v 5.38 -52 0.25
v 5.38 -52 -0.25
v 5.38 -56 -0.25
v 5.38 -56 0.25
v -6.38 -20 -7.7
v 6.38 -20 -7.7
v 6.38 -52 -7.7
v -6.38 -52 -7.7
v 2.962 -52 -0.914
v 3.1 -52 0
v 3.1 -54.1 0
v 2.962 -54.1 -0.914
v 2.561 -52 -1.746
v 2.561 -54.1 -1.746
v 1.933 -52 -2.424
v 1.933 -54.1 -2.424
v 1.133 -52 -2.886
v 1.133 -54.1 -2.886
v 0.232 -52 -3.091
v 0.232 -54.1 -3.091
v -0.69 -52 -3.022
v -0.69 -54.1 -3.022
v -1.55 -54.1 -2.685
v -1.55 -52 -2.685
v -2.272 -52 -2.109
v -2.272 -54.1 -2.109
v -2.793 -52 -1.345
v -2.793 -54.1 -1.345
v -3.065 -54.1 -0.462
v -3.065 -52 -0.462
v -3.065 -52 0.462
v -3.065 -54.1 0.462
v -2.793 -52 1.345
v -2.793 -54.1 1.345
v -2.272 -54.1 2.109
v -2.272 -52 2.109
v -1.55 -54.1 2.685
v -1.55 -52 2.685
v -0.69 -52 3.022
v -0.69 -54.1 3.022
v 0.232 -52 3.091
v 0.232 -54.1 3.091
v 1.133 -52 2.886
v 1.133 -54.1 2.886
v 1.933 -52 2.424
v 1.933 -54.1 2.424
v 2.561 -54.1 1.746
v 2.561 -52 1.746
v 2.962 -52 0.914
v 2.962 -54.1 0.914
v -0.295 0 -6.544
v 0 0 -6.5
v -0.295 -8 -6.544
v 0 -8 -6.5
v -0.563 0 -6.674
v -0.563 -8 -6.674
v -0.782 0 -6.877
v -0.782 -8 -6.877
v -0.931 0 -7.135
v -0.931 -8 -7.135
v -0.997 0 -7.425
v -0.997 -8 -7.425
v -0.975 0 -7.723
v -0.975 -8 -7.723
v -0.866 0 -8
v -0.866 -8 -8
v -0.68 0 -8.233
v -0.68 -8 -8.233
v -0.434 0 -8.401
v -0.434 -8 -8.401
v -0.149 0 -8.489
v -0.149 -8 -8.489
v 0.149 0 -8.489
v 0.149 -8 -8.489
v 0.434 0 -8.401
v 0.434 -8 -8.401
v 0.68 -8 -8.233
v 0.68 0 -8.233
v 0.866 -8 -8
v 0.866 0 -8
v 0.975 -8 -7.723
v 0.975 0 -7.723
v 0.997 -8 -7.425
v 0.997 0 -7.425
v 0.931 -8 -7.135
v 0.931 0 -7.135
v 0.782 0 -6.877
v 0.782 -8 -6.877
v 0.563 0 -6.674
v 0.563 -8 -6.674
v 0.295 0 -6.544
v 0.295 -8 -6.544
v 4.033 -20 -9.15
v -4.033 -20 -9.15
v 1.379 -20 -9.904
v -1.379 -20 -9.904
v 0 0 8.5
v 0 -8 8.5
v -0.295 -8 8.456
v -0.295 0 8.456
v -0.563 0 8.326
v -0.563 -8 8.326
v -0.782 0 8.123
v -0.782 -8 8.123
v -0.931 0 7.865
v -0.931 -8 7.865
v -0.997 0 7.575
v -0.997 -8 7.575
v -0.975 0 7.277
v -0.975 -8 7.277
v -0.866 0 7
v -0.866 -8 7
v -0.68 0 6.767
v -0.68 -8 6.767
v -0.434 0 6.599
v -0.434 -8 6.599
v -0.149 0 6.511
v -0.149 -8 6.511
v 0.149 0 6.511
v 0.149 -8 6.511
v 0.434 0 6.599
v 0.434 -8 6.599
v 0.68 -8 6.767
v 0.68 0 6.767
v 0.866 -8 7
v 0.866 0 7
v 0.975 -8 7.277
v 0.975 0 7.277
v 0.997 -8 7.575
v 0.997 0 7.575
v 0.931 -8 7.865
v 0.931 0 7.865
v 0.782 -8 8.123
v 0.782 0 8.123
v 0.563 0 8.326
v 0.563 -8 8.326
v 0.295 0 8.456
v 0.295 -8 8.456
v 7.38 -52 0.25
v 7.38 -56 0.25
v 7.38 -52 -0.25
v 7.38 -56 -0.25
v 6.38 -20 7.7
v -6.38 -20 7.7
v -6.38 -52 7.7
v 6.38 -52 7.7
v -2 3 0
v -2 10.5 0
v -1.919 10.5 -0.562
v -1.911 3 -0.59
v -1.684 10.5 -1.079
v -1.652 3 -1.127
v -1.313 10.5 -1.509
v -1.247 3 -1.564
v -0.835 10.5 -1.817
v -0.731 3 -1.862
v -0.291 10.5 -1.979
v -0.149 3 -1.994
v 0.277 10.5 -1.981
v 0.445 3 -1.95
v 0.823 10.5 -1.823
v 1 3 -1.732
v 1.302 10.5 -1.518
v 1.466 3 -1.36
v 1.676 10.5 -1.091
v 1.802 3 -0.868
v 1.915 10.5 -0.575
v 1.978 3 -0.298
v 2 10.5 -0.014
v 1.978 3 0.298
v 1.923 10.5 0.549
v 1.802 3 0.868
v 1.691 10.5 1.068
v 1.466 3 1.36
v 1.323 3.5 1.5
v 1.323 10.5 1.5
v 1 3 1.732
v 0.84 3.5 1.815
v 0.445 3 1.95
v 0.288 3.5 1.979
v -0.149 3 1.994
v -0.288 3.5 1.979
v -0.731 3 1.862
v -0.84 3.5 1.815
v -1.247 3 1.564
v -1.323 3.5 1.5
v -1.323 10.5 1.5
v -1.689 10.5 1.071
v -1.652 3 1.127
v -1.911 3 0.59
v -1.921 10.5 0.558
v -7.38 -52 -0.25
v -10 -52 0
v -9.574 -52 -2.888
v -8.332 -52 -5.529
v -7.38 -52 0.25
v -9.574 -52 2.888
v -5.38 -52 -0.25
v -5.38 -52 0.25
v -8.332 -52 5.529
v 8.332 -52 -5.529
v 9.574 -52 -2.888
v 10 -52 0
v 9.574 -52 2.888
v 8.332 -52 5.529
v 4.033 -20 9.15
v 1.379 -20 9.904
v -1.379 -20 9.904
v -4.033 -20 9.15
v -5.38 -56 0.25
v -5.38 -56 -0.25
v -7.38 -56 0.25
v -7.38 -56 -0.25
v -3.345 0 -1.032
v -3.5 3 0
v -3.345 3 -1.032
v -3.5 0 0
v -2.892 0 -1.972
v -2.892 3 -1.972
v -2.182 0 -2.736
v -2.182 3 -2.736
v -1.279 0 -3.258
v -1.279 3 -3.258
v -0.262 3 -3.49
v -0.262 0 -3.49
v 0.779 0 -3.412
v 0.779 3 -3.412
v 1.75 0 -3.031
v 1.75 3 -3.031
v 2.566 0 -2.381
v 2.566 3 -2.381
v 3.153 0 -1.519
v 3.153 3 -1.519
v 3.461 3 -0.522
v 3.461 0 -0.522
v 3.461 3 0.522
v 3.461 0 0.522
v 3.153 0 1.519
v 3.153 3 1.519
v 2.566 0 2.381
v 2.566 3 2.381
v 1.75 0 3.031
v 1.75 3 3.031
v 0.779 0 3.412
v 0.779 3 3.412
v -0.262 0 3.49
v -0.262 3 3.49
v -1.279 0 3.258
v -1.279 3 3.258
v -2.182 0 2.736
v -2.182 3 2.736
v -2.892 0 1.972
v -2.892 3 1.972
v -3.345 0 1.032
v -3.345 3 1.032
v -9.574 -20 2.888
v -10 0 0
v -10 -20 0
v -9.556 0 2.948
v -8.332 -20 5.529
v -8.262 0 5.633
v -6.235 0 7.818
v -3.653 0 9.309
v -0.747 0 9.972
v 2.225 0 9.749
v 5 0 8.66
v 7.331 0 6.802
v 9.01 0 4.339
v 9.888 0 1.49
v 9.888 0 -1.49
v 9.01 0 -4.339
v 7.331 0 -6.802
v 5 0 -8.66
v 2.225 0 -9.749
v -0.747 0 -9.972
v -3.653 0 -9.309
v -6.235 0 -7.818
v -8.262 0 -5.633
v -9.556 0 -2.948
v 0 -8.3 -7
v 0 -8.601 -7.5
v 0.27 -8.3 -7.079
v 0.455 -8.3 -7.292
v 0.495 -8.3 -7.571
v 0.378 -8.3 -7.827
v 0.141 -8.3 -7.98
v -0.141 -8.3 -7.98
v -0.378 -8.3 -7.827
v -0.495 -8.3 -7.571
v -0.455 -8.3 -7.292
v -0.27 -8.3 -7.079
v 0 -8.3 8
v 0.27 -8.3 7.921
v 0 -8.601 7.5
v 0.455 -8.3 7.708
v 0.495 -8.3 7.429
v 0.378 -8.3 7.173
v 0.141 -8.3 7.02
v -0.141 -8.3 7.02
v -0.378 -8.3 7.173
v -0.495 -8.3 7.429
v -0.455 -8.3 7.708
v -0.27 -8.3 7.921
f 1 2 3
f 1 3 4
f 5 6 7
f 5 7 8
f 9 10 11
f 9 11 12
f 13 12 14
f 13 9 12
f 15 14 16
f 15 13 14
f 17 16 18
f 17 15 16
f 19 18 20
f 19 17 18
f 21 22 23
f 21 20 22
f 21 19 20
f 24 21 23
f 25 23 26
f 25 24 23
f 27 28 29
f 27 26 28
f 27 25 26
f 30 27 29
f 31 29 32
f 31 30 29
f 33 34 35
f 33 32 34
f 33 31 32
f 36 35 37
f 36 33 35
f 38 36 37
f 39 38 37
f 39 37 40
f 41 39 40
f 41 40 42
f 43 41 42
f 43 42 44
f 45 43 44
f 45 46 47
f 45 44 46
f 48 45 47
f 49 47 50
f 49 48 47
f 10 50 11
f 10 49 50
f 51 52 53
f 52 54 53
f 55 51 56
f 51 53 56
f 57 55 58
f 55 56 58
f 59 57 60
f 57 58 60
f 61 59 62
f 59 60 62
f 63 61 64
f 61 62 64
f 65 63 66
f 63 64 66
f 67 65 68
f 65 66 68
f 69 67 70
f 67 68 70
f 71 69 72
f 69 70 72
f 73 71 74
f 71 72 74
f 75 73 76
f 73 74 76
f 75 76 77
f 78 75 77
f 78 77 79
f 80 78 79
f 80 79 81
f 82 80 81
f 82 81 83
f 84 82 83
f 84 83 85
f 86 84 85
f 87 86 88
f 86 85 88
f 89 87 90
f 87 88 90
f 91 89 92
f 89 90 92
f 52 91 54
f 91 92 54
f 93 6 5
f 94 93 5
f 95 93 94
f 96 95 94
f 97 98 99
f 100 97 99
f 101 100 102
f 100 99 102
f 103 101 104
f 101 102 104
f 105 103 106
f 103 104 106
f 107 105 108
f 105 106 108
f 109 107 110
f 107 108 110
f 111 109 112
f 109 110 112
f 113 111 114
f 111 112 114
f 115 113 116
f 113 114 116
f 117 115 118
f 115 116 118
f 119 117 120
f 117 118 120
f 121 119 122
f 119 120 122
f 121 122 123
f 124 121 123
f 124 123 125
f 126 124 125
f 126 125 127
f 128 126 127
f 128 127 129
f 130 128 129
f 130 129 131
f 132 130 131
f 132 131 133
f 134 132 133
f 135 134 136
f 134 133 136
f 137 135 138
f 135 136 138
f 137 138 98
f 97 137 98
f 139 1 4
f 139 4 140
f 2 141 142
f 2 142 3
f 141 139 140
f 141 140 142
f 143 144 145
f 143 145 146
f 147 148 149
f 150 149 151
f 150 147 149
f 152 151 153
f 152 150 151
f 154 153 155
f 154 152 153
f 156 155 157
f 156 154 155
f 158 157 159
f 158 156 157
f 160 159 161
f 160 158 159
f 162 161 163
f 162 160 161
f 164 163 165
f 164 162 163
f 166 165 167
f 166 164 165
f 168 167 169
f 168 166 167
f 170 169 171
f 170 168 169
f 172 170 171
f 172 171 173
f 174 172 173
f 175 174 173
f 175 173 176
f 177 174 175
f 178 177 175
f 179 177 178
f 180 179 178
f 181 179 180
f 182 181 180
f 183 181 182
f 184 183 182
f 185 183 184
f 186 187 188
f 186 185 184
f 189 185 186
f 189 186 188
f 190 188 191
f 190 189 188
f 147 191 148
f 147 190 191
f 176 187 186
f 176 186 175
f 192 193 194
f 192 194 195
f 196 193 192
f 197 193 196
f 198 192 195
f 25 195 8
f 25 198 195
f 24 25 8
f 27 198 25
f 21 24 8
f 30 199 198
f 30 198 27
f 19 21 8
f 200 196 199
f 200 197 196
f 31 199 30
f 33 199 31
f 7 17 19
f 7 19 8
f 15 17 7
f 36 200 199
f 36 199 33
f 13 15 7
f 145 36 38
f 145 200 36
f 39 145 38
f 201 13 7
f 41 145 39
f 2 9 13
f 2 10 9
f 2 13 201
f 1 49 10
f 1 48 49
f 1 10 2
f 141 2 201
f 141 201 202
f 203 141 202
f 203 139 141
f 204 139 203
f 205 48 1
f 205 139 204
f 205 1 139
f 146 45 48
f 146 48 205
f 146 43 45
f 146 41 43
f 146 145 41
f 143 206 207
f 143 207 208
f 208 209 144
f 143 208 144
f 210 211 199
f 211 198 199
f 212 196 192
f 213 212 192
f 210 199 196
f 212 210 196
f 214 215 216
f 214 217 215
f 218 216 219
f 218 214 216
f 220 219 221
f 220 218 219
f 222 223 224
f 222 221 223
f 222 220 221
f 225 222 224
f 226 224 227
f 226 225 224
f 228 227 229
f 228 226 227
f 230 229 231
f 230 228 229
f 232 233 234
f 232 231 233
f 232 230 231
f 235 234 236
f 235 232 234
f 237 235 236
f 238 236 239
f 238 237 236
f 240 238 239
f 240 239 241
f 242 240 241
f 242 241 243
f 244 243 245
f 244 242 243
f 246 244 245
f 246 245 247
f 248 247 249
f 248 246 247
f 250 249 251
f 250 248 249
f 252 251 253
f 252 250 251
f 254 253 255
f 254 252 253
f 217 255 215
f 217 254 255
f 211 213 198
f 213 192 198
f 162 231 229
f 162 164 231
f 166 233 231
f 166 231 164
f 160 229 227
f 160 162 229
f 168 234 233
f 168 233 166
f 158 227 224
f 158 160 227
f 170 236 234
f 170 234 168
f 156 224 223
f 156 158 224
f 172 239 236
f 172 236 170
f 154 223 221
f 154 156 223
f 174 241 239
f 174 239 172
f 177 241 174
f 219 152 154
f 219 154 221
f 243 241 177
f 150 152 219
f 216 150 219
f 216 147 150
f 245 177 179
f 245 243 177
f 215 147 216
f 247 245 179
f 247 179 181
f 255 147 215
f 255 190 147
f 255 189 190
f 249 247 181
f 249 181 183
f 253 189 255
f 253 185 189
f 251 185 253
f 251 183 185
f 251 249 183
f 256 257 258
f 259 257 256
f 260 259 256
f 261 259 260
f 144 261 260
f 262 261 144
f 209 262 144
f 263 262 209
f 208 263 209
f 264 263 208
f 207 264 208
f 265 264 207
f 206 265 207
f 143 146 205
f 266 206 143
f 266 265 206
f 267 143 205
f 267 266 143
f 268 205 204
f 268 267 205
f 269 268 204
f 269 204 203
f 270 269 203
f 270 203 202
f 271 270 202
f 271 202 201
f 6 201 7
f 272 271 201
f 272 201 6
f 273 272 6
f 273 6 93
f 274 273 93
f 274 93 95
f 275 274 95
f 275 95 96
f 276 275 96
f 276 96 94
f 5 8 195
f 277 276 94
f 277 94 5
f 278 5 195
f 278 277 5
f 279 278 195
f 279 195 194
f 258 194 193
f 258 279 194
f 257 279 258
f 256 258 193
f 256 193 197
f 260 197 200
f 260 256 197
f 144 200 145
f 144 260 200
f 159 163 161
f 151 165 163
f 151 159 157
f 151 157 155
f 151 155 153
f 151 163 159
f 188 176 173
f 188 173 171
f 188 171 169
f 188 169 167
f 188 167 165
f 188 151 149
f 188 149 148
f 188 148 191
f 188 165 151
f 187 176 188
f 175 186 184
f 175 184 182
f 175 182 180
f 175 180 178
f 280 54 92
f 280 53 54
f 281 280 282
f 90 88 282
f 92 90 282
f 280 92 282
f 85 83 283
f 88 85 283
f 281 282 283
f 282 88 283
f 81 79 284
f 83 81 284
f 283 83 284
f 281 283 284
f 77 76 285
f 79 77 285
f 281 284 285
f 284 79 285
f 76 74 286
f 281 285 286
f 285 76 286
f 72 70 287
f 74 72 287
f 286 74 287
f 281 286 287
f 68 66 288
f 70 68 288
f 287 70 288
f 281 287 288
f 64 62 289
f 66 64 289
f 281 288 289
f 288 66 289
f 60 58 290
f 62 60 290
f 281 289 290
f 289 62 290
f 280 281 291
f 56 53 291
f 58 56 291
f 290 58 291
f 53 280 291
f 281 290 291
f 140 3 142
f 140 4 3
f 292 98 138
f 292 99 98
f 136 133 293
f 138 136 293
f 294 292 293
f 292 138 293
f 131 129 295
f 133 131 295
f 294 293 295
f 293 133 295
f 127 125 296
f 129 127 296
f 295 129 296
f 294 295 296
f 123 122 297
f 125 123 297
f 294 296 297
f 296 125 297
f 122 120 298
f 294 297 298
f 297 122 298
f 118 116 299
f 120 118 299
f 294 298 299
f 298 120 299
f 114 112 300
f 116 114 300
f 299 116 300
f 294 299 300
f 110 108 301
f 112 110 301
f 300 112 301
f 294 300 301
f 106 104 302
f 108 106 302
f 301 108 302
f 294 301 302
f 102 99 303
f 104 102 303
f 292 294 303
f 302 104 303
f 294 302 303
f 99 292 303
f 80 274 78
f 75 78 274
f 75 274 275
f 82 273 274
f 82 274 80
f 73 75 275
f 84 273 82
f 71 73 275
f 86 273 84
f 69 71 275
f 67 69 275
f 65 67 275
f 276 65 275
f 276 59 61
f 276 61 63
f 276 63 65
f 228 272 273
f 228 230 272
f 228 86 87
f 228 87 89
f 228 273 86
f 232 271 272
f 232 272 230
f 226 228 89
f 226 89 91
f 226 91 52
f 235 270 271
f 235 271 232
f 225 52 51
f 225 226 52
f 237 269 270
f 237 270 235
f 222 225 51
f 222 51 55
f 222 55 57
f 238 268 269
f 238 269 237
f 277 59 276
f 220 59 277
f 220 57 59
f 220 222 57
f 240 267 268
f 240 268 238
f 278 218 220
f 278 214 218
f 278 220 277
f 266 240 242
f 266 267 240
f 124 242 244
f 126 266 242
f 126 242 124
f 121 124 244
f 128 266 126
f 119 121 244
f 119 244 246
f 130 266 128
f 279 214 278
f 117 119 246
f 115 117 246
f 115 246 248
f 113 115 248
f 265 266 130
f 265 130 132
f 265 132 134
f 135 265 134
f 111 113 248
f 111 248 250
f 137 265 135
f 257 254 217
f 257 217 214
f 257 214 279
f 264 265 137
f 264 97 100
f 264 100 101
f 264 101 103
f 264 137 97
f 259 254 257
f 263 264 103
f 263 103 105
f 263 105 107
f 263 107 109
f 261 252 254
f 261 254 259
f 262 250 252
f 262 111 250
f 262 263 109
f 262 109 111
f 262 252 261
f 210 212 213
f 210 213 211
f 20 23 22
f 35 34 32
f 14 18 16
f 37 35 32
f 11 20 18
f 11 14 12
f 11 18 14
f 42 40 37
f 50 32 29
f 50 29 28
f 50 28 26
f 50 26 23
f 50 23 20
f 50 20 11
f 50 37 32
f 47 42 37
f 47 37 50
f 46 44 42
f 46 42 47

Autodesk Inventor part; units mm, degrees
ref_plane "YZ Plane" through (0, 0, 0) normal (1, 0, 0) x (0, 1, 0)
ref_plane "XZ Plane" through (0, 0, 0) normal (0, 1, 0) x (-1, 0, 0)
ref_plane "XY Plane" through (0, 0, 0) normal (0, 0, 1) x (1, 0, 0)
sketch "Эскиз1" plane through (0, 0, 0) normal (0, 1, 0) x (-1, 0, 0)
  circle A0 centre (0, 0) radius 10
  circle A1 centre (0, 0) radius 3.5
  circle A2 centre (0, 0) radius 2
  dimension "d0" = 20
  dimension "d1" = 7
  dimension "d2" = 4
extrude "Выдавливание1" add sketch "Эскиз1" against normal blind 20 contours A0 | A1 | A2
extrude "Выдавливание2" add sketch "Эскиз1" along normal blind 3 contours A1
extrude "Выдавливание3" add sketch "Эскиз1" along normal blind 10.5 contours A2
sketch "Эскиз2" plane through (0, 10.5, 0) normal (0, 1, 0) x (1, 0, 0)
  circle A0 centre (0, 0) radius 2 projected
  circle A1 centre (0, 0) radius 2 projected
  circle A2 centre (0, 0) radius 3.5 projected
  line L0 (-3.1623, -1.5) -> (3.1623, -1.5)
  point P0 (0, 2)
  point P1 (0, 3.5)
  point P2 (1.3229, -1.5)
  point P3 (-1.3229, -1.5)
  dimension "d9" = 1.5
extrude "Выдавливание4" cut sketch "Эскиз2" against normal blind 7 contours L0 A0 picked at (0.3089, -1.5908)
sketch "Эскиз3" plane through (0, -20, 0) normal (0, -1, 0) x (1, 0, 0)
  line L0 (6.3804, -7.7) -> (-6.3804, -7.7)
  line L1 (-6.3804, -7.7) -> (-6.3804, 7.7)
  line L2 (-6.3804, 7.7) -> (6.3804, 7.7)
  line L3 (6.3804, 7.7) -> (6.3804, -7.7)
  circle A0 centre (0, 0) radius 10 projected
  arc A1 (6.3804, -7.7) -> (6.3804, 7.7) centre (0, 0) ccw
  arc A2 (-6.3804, 7.7) -> (-6.3804, -7.7) centre (0, 0) ccw
  line L4 (5.3804, 0.25) -> (7.3804, 0.25)
  line L5 (7.3804, 0.25) -> (7.3804, -0.25)
  line L6 (7.3804, -0.25) -> (5.3804, -0.25)
  line L7 (5.3804, -0.25) -> (5.3804, 0.25)
  line L8 (5.3804, 0.25) -> (7.3804, -0.25) construction
  line L9 (0, -7.7) -> (0, 7.7) construction
  line L10 (-5.3804, 0.25) -> (-7.3804, 0.25)
  line L11 (-7.3804, 0.25) -> (-7.3804, -0.25)
  line L12 (-7.3804, -0.25) -> (-5.3804, -0.25)
  line L13 (-5.3804, -0.25) -> (-5.3804, 0.25)
  point P0 (6.3804, 0)
  point P1 (-6.3804, -7.7)
  dimension "d12" = 15.4
  dimension "d13" = 2
  dimension "d14" = 0.5
extrude "Выдавливание5" add sketch "Эскиз3" along normal blind 36 contours L6 L7 L4 L3 | L3 L4 L5 L6 | L12 L11 L10 L1 | L1 L10 L13 L12
extrude "Выдавливание6" add sketch "Эскиз3" along normal blind 32 contours L0 L1 L12 L13 L10 L2 L3 L4 L7 L6 | L3 L6 L5 L4 A0 | A0 L1 L10 L11 L12
sketch "Эскиз4" plane through (0, -52, 0) normal (0, -1, 0) x (1, 0, 0)
  circle A0 centre (0, 0) radius 2 projected
  circle A1 centre (0, 0) radius 3.1
  dimension "d19" = 6.2
extrude "Выдавливание7" add sketch "Эскиз4" along normal blind 2.1 contours A0 | A1
sketch "Эскиз5" plane through (0, 0, 0) normal (0, 1, 0) x (1, 0, 0)
  circle A0 centre (0, 0) radius 10 construction
  line L0 (0, 10) -> (0, -10) construction
  circle A1 centre (0, 7.5) radius 1
  circle A2 centre (0, -7.5) radius 1
  dimension "d22" = 7.5
  dimension "d23" = 15
  dimension "d24" = 2
hole "Отверстие1" at (0, 0, 7.5) direction (0, -1, 0) diameter 2 depth 8 tip angle 118
hole "Отверстие2" at (0, 0, -7.5) direction (0, -1, 0) diameter 2 depth 8 tip angle 118
properties part number "motor20"
